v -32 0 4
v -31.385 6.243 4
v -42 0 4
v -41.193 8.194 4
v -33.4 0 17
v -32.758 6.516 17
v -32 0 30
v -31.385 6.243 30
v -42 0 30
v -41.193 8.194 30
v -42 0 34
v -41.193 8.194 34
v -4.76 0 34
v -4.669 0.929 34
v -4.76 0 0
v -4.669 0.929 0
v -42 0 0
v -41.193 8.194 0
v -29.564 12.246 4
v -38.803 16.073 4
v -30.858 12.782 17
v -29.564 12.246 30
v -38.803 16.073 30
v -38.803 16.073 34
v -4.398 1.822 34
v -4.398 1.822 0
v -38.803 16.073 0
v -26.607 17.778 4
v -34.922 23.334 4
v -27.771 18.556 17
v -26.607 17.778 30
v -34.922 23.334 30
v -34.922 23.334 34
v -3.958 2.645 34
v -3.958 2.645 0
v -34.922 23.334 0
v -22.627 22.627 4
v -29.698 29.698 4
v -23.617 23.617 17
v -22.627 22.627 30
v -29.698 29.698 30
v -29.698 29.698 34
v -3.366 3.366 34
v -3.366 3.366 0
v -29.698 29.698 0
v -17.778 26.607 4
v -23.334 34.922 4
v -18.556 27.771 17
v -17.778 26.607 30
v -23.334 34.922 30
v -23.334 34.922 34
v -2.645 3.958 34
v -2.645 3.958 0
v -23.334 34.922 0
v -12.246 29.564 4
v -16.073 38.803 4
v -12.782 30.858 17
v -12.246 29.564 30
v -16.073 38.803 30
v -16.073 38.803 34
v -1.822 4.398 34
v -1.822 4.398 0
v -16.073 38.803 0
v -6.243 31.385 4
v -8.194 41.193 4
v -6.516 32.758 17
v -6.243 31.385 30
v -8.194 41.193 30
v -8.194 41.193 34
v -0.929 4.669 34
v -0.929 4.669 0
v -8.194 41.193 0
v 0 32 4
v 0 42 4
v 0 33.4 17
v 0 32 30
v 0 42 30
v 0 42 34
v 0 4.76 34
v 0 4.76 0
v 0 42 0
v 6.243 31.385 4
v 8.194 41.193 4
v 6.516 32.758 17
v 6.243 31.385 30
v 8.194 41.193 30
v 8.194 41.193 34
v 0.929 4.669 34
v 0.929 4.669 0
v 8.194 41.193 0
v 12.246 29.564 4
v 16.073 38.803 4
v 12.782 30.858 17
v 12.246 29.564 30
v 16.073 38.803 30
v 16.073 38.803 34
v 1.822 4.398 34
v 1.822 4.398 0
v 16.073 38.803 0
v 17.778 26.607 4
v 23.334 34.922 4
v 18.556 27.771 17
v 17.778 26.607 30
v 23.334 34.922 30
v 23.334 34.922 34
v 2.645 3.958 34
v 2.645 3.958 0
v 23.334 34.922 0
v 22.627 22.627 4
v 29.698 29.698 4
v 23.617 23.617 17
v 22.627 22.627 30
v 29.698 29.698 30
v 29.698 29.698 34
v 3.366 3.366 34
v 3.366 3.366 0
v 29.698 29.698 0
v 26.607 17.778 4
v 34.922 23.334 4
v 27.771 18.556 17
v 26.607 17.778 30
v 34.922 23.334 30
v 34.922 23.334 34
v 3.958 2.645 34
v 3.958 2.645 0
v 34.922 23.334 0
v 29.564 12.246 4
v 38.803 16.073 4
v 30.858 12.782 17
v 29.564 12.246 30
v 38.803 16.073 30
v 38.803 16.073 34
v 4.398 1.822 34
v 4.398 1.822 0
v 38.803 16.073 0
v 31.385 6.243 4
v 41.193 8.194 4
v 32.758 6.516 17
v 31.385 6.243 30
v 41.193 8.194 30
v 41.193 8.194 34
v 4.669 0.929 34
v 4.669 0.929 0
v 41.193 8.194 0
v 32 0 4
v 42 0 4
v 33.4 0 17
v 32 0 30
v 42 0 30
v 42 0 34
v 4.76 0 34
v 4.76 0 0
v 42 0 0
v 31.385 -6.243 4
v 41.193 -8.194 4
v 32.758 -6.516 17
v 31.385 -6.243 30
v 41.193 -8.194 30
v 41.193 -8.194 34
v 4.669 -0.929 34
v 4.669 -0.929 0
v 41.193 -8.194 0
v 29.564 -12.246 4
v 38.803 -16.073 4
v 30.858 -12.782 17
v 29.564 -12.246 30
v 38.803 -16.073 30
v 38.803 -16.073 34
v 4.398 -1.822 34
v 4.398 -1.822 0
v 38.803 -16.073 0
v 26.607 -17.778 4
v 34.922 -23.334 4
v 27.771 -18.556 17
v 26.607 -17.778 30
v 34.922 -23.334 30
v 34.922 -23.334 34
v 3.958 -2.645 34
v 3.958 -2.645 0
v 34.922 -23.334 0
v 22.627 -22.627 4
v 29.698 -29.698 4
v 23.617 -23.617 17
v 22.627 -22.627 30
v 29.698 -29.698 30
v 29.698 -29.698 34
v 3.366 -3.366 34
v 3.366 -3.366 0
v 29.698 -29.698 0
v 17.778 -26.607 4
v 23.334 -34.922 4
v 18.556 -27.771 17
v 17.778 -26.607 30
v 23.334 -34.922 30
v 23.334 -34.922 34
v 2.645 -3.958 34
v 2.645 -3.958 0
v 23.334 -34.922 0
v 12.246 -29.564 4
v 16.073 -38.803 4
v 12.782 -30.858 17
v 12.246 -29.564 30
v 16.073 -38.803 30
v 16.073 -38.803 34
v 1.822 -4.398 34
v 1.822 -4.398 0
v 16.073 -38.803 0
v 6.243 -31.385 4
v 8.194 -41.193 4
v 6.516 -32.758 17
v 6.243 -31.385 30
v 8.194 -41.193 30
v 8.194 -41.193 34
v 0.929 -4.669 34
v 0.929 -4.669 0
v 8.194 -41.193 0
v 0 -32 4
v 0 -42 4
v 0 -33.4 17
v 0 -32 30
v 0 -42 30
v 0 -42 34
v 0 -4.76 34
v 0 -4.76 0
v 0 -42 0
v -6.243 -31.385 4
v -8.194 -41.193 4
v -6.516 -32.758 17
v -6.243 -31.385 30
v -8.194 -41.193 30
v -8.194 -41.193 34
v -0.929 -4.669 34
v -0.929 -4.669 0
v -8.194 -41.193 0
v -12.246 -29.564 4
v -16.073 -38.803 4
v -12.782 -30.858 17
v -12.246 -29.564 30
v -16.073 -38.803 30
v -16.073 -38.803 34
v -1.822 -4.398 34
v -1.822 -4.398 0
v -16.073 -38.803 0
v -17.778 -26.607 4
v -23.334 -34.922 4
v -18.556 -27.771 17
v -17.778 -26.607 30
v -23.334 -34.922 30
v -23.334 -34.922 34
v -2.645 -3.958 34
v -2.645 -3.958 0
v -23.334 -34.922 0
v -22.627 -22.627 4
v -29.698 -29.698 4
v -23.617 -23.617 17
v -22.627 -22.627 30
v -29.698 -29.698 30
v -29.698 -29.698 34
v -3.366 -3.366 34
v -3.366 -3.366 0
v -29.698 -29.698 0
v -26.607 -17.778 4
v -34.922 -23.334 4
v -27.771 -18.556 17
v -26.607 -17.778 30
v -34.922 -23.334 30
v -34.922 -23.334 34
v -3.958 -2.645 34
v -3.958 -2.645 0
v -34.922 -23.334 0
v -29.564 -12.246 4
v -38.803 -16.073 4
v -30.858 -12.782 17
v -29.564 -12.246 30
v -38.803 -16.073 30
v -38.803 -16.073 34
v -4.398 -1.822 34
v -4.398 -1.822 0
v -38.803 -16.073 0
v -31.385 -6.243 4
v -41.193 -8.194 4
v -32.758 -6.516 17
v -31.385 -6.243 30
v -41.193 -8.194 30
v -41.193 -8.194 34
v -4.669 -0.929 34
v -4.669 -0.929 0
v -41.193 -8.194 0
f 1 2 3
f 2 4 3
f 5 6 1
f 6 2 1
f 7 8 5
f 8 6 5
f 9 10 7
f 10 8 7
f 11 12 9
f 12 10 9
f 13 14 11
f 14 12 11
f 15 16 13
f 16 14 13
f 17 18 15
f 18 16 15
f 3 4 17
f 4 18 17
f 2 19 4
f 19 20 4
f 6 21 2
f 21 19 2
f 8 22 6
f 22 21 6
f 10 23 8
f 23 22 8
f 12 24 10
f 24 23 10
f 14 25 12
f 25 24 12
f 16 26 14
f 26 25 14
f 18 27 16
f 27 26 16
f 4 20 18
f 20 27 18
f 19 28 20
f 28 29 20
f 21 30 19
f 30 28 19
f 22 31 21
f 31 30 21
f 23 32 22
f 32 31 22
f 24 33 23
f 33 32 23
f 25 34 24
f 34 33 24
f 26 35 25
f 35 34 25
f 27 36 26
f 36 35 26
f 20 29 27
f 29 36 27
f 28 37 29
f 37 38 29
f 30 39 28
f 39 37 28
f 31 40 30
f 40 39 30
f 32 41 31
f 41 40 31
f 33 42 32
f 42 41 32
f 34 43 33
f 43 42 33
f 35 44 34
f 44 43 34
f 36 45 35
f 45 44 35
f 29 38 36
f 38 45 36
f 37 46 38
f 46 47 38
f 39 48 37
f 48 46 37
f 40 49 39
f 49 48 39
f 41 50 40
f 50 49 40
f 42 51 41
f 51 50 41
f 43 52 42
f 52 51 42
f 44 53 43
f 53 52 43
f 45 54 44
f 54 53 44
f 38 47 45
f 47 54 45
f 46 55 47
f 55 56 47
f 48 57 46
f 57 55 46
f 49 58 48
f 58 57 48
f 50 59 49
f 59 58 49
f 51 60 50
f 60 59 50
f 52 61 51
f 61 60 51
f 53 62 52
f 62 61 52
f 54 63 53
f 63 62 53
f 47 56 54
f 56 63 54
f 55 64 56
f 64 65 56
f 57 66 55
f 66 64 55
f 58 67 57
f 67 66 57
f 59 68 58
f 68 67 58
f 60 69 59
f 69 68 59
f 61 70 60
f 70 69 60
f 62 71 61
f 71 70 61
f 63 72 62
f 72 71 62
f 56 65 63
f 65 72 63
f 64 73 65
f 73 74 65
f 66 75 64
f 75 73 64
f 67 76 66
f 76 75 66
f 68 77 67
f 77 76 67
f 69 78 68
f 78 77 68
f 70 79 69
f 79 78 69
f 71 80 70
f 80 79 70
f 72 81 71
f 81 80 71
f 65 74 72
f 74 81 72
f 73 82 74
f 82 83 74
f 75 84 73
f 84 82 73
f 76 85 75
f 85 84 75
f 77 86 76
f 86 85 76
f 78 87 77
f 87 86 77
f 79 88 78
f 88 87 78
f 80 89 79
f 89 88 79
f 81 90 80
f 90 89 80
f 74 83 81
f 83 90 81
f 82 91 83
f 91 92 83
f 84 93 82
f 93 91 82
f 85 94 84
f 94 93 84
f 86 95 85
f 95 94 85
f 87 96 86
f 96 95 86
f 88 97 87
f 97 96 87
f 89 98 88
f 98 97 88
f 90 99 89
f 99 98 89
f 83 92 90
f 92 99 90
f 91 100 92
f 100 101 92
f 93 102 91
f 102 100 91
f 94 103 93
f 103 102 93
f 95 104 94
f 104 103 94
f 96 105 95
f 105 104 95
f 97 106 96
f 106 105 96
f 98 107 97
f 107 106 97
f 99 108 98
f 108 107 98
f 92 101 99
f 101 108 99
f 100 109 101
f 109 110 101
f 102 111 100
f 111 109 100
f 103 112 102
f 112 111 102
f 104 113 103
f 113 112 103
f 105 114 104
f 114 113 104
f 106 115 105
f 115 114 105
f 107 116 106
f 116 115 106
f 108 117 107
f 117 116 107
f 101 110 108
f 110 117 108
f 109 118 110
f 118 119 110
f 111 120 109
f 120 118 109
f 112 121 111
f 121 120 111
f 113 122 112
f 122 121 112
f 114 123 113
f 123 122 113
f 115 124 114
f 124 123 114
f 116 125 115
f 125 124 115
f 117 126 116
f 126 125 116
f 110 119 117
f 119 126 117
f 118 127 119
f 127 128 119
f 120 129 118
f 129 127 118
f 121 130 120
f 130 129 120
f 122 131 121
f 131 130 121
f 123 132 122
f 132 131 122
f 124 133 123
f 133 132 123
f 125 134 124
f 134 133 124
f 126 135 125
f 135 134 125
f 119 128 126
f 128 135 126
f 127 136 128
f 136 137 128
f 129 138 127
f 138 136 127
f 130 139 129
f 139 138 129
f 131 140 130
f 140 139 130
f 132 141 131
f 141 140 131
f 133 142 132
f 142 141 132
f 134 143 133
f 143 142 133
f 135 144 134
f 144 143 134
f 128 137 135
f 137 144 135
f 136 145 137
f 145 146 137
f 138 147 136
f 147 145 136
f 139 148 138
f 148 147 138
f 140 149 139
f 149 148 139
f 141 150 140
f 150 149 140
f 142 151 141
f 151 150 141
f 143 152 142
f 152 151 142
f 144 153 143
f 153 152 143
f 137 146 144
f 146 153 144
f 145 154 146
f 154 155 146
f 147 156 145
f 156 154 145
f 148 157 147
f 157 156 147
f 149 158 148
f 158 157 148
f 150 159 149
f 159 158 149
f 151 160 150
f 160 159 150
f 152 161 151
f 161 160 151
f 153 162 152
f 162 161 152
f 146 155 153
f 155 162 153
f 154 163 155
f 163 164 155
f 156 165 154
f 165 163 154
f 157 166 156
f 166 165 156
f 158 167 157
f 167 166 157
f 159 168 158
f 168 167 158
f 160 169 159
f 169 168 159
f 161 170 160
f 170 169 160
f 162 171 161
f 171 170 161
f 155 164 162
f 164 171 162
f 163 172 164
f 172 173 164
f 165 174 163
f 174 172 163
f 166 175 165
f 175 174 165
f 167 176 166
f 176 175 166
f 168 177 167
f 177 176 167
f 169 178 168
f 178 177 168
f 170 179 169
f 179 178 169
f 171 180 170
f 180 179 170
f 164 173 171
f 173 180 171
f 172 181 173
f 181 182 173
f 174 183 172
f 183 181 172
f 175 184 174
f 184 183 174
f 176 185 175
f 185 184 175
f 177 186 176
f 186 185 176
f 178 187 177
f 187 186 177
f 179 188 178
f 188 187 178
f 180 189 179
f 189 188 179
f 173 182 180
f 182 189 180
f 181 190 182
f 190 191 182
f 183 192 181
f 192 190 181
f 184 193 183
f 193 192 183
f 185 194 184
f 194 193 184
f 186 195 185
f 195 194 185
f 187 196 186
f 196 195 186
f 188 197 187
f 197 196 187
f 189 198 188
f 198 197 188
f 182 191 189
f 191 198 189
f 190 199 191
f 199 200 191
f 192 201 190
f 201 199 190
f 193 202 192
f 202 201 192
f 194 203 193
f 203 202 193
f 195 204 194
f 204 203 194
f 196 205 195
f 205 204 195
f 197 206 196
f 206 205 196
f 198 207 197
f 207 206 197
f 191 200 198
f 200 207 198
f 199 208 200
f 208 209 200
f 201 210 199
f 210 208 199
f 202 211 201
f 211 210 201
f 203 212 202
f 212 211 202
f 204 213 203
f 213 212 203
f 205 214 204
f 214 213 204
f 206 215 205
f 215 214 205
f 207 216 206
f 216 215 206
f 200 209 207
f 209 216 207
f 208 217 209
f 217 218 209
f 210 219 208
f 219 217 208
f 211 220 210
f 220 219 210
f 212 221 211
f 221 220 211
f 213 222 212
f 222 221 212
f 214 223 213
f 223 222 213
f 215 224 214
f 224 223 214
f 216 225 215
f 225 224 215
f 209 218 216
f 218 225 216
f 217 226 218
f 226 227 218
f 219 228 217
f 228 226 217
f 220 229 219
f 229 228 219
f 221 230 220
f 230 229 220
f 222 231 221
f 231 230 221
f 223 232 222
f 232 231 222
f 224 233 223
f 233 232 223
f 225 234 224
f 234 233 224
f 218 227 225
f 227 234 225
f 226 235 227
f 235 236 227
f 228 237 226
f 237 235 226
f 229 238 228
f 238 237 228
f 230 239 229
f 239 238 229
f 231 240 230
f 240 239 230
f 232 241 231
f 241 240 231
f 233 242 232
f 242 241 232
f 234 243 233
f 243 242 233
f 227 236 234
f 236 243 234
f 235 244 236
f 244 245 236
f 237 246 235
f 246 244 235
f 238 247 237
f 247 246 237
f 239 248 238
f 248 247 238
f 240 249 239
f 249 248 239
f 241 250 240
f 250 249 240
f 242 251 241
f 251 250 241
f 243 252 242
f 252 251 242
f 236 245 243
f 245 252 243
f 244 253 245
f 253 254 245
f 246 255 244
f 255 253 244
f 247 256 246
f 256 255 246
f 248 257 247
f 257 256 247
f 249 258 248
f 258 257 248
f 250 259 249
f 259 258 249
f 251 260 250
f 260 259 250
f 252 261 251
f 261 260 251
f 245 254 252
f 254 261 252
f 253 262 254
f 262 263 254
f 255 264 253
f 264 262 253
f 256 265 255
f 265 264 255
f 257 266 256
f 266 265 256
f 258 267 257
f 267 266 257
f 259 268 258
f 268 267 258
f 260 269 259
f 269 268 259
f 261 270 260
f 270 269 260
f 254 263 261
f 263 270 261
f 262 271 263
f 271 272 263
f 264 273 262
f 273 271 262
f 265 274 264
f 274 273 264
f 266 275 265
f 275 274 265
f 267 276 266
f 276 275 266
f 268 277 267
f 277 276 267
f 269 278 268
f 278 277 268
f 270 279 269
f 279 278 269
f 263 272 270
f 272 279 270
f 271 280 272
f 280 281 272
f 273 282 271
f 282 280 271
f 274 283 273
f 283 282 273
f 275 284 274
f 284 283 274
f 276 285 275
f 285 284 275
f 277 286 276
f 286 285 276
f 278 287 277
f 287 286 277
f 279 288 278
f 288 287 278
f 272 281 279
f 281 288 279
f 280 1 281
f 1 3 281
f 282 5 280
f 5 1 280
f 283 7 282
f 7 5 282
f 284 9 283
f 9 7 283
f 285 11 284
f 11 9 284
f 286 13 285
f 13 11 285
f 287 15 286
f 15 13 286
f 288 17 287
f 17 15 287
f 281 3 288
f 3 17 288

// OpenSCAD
$fn = 32;

// ----------------------------------------------------------------------
// Belt roller: 64 mm barrel, 34 mm wide, bore 9.52 mm
// ----------------------------------------------------------------------

// --- parameters (mm) ---
bore_d = 9.52;            // bore
barrel_d = 64;            // barrel diameter
roller_w = 34;            // roller width
flange_d = 84;            // flange diameter
flange_t = 4;             // flange thickness
hub_d = 33.52;            // hub diameter

roller_profile = [[4.76, 0], [42, 0], [42, 4], [32, 4], [33.4, 17], [32, 30], [42, 30], [42, 34], [4.76, 34]];

/* the profile stays clear of the axis, so the bore comes out of the revolve */
rotate_extrude() polygon(roller_profile);
